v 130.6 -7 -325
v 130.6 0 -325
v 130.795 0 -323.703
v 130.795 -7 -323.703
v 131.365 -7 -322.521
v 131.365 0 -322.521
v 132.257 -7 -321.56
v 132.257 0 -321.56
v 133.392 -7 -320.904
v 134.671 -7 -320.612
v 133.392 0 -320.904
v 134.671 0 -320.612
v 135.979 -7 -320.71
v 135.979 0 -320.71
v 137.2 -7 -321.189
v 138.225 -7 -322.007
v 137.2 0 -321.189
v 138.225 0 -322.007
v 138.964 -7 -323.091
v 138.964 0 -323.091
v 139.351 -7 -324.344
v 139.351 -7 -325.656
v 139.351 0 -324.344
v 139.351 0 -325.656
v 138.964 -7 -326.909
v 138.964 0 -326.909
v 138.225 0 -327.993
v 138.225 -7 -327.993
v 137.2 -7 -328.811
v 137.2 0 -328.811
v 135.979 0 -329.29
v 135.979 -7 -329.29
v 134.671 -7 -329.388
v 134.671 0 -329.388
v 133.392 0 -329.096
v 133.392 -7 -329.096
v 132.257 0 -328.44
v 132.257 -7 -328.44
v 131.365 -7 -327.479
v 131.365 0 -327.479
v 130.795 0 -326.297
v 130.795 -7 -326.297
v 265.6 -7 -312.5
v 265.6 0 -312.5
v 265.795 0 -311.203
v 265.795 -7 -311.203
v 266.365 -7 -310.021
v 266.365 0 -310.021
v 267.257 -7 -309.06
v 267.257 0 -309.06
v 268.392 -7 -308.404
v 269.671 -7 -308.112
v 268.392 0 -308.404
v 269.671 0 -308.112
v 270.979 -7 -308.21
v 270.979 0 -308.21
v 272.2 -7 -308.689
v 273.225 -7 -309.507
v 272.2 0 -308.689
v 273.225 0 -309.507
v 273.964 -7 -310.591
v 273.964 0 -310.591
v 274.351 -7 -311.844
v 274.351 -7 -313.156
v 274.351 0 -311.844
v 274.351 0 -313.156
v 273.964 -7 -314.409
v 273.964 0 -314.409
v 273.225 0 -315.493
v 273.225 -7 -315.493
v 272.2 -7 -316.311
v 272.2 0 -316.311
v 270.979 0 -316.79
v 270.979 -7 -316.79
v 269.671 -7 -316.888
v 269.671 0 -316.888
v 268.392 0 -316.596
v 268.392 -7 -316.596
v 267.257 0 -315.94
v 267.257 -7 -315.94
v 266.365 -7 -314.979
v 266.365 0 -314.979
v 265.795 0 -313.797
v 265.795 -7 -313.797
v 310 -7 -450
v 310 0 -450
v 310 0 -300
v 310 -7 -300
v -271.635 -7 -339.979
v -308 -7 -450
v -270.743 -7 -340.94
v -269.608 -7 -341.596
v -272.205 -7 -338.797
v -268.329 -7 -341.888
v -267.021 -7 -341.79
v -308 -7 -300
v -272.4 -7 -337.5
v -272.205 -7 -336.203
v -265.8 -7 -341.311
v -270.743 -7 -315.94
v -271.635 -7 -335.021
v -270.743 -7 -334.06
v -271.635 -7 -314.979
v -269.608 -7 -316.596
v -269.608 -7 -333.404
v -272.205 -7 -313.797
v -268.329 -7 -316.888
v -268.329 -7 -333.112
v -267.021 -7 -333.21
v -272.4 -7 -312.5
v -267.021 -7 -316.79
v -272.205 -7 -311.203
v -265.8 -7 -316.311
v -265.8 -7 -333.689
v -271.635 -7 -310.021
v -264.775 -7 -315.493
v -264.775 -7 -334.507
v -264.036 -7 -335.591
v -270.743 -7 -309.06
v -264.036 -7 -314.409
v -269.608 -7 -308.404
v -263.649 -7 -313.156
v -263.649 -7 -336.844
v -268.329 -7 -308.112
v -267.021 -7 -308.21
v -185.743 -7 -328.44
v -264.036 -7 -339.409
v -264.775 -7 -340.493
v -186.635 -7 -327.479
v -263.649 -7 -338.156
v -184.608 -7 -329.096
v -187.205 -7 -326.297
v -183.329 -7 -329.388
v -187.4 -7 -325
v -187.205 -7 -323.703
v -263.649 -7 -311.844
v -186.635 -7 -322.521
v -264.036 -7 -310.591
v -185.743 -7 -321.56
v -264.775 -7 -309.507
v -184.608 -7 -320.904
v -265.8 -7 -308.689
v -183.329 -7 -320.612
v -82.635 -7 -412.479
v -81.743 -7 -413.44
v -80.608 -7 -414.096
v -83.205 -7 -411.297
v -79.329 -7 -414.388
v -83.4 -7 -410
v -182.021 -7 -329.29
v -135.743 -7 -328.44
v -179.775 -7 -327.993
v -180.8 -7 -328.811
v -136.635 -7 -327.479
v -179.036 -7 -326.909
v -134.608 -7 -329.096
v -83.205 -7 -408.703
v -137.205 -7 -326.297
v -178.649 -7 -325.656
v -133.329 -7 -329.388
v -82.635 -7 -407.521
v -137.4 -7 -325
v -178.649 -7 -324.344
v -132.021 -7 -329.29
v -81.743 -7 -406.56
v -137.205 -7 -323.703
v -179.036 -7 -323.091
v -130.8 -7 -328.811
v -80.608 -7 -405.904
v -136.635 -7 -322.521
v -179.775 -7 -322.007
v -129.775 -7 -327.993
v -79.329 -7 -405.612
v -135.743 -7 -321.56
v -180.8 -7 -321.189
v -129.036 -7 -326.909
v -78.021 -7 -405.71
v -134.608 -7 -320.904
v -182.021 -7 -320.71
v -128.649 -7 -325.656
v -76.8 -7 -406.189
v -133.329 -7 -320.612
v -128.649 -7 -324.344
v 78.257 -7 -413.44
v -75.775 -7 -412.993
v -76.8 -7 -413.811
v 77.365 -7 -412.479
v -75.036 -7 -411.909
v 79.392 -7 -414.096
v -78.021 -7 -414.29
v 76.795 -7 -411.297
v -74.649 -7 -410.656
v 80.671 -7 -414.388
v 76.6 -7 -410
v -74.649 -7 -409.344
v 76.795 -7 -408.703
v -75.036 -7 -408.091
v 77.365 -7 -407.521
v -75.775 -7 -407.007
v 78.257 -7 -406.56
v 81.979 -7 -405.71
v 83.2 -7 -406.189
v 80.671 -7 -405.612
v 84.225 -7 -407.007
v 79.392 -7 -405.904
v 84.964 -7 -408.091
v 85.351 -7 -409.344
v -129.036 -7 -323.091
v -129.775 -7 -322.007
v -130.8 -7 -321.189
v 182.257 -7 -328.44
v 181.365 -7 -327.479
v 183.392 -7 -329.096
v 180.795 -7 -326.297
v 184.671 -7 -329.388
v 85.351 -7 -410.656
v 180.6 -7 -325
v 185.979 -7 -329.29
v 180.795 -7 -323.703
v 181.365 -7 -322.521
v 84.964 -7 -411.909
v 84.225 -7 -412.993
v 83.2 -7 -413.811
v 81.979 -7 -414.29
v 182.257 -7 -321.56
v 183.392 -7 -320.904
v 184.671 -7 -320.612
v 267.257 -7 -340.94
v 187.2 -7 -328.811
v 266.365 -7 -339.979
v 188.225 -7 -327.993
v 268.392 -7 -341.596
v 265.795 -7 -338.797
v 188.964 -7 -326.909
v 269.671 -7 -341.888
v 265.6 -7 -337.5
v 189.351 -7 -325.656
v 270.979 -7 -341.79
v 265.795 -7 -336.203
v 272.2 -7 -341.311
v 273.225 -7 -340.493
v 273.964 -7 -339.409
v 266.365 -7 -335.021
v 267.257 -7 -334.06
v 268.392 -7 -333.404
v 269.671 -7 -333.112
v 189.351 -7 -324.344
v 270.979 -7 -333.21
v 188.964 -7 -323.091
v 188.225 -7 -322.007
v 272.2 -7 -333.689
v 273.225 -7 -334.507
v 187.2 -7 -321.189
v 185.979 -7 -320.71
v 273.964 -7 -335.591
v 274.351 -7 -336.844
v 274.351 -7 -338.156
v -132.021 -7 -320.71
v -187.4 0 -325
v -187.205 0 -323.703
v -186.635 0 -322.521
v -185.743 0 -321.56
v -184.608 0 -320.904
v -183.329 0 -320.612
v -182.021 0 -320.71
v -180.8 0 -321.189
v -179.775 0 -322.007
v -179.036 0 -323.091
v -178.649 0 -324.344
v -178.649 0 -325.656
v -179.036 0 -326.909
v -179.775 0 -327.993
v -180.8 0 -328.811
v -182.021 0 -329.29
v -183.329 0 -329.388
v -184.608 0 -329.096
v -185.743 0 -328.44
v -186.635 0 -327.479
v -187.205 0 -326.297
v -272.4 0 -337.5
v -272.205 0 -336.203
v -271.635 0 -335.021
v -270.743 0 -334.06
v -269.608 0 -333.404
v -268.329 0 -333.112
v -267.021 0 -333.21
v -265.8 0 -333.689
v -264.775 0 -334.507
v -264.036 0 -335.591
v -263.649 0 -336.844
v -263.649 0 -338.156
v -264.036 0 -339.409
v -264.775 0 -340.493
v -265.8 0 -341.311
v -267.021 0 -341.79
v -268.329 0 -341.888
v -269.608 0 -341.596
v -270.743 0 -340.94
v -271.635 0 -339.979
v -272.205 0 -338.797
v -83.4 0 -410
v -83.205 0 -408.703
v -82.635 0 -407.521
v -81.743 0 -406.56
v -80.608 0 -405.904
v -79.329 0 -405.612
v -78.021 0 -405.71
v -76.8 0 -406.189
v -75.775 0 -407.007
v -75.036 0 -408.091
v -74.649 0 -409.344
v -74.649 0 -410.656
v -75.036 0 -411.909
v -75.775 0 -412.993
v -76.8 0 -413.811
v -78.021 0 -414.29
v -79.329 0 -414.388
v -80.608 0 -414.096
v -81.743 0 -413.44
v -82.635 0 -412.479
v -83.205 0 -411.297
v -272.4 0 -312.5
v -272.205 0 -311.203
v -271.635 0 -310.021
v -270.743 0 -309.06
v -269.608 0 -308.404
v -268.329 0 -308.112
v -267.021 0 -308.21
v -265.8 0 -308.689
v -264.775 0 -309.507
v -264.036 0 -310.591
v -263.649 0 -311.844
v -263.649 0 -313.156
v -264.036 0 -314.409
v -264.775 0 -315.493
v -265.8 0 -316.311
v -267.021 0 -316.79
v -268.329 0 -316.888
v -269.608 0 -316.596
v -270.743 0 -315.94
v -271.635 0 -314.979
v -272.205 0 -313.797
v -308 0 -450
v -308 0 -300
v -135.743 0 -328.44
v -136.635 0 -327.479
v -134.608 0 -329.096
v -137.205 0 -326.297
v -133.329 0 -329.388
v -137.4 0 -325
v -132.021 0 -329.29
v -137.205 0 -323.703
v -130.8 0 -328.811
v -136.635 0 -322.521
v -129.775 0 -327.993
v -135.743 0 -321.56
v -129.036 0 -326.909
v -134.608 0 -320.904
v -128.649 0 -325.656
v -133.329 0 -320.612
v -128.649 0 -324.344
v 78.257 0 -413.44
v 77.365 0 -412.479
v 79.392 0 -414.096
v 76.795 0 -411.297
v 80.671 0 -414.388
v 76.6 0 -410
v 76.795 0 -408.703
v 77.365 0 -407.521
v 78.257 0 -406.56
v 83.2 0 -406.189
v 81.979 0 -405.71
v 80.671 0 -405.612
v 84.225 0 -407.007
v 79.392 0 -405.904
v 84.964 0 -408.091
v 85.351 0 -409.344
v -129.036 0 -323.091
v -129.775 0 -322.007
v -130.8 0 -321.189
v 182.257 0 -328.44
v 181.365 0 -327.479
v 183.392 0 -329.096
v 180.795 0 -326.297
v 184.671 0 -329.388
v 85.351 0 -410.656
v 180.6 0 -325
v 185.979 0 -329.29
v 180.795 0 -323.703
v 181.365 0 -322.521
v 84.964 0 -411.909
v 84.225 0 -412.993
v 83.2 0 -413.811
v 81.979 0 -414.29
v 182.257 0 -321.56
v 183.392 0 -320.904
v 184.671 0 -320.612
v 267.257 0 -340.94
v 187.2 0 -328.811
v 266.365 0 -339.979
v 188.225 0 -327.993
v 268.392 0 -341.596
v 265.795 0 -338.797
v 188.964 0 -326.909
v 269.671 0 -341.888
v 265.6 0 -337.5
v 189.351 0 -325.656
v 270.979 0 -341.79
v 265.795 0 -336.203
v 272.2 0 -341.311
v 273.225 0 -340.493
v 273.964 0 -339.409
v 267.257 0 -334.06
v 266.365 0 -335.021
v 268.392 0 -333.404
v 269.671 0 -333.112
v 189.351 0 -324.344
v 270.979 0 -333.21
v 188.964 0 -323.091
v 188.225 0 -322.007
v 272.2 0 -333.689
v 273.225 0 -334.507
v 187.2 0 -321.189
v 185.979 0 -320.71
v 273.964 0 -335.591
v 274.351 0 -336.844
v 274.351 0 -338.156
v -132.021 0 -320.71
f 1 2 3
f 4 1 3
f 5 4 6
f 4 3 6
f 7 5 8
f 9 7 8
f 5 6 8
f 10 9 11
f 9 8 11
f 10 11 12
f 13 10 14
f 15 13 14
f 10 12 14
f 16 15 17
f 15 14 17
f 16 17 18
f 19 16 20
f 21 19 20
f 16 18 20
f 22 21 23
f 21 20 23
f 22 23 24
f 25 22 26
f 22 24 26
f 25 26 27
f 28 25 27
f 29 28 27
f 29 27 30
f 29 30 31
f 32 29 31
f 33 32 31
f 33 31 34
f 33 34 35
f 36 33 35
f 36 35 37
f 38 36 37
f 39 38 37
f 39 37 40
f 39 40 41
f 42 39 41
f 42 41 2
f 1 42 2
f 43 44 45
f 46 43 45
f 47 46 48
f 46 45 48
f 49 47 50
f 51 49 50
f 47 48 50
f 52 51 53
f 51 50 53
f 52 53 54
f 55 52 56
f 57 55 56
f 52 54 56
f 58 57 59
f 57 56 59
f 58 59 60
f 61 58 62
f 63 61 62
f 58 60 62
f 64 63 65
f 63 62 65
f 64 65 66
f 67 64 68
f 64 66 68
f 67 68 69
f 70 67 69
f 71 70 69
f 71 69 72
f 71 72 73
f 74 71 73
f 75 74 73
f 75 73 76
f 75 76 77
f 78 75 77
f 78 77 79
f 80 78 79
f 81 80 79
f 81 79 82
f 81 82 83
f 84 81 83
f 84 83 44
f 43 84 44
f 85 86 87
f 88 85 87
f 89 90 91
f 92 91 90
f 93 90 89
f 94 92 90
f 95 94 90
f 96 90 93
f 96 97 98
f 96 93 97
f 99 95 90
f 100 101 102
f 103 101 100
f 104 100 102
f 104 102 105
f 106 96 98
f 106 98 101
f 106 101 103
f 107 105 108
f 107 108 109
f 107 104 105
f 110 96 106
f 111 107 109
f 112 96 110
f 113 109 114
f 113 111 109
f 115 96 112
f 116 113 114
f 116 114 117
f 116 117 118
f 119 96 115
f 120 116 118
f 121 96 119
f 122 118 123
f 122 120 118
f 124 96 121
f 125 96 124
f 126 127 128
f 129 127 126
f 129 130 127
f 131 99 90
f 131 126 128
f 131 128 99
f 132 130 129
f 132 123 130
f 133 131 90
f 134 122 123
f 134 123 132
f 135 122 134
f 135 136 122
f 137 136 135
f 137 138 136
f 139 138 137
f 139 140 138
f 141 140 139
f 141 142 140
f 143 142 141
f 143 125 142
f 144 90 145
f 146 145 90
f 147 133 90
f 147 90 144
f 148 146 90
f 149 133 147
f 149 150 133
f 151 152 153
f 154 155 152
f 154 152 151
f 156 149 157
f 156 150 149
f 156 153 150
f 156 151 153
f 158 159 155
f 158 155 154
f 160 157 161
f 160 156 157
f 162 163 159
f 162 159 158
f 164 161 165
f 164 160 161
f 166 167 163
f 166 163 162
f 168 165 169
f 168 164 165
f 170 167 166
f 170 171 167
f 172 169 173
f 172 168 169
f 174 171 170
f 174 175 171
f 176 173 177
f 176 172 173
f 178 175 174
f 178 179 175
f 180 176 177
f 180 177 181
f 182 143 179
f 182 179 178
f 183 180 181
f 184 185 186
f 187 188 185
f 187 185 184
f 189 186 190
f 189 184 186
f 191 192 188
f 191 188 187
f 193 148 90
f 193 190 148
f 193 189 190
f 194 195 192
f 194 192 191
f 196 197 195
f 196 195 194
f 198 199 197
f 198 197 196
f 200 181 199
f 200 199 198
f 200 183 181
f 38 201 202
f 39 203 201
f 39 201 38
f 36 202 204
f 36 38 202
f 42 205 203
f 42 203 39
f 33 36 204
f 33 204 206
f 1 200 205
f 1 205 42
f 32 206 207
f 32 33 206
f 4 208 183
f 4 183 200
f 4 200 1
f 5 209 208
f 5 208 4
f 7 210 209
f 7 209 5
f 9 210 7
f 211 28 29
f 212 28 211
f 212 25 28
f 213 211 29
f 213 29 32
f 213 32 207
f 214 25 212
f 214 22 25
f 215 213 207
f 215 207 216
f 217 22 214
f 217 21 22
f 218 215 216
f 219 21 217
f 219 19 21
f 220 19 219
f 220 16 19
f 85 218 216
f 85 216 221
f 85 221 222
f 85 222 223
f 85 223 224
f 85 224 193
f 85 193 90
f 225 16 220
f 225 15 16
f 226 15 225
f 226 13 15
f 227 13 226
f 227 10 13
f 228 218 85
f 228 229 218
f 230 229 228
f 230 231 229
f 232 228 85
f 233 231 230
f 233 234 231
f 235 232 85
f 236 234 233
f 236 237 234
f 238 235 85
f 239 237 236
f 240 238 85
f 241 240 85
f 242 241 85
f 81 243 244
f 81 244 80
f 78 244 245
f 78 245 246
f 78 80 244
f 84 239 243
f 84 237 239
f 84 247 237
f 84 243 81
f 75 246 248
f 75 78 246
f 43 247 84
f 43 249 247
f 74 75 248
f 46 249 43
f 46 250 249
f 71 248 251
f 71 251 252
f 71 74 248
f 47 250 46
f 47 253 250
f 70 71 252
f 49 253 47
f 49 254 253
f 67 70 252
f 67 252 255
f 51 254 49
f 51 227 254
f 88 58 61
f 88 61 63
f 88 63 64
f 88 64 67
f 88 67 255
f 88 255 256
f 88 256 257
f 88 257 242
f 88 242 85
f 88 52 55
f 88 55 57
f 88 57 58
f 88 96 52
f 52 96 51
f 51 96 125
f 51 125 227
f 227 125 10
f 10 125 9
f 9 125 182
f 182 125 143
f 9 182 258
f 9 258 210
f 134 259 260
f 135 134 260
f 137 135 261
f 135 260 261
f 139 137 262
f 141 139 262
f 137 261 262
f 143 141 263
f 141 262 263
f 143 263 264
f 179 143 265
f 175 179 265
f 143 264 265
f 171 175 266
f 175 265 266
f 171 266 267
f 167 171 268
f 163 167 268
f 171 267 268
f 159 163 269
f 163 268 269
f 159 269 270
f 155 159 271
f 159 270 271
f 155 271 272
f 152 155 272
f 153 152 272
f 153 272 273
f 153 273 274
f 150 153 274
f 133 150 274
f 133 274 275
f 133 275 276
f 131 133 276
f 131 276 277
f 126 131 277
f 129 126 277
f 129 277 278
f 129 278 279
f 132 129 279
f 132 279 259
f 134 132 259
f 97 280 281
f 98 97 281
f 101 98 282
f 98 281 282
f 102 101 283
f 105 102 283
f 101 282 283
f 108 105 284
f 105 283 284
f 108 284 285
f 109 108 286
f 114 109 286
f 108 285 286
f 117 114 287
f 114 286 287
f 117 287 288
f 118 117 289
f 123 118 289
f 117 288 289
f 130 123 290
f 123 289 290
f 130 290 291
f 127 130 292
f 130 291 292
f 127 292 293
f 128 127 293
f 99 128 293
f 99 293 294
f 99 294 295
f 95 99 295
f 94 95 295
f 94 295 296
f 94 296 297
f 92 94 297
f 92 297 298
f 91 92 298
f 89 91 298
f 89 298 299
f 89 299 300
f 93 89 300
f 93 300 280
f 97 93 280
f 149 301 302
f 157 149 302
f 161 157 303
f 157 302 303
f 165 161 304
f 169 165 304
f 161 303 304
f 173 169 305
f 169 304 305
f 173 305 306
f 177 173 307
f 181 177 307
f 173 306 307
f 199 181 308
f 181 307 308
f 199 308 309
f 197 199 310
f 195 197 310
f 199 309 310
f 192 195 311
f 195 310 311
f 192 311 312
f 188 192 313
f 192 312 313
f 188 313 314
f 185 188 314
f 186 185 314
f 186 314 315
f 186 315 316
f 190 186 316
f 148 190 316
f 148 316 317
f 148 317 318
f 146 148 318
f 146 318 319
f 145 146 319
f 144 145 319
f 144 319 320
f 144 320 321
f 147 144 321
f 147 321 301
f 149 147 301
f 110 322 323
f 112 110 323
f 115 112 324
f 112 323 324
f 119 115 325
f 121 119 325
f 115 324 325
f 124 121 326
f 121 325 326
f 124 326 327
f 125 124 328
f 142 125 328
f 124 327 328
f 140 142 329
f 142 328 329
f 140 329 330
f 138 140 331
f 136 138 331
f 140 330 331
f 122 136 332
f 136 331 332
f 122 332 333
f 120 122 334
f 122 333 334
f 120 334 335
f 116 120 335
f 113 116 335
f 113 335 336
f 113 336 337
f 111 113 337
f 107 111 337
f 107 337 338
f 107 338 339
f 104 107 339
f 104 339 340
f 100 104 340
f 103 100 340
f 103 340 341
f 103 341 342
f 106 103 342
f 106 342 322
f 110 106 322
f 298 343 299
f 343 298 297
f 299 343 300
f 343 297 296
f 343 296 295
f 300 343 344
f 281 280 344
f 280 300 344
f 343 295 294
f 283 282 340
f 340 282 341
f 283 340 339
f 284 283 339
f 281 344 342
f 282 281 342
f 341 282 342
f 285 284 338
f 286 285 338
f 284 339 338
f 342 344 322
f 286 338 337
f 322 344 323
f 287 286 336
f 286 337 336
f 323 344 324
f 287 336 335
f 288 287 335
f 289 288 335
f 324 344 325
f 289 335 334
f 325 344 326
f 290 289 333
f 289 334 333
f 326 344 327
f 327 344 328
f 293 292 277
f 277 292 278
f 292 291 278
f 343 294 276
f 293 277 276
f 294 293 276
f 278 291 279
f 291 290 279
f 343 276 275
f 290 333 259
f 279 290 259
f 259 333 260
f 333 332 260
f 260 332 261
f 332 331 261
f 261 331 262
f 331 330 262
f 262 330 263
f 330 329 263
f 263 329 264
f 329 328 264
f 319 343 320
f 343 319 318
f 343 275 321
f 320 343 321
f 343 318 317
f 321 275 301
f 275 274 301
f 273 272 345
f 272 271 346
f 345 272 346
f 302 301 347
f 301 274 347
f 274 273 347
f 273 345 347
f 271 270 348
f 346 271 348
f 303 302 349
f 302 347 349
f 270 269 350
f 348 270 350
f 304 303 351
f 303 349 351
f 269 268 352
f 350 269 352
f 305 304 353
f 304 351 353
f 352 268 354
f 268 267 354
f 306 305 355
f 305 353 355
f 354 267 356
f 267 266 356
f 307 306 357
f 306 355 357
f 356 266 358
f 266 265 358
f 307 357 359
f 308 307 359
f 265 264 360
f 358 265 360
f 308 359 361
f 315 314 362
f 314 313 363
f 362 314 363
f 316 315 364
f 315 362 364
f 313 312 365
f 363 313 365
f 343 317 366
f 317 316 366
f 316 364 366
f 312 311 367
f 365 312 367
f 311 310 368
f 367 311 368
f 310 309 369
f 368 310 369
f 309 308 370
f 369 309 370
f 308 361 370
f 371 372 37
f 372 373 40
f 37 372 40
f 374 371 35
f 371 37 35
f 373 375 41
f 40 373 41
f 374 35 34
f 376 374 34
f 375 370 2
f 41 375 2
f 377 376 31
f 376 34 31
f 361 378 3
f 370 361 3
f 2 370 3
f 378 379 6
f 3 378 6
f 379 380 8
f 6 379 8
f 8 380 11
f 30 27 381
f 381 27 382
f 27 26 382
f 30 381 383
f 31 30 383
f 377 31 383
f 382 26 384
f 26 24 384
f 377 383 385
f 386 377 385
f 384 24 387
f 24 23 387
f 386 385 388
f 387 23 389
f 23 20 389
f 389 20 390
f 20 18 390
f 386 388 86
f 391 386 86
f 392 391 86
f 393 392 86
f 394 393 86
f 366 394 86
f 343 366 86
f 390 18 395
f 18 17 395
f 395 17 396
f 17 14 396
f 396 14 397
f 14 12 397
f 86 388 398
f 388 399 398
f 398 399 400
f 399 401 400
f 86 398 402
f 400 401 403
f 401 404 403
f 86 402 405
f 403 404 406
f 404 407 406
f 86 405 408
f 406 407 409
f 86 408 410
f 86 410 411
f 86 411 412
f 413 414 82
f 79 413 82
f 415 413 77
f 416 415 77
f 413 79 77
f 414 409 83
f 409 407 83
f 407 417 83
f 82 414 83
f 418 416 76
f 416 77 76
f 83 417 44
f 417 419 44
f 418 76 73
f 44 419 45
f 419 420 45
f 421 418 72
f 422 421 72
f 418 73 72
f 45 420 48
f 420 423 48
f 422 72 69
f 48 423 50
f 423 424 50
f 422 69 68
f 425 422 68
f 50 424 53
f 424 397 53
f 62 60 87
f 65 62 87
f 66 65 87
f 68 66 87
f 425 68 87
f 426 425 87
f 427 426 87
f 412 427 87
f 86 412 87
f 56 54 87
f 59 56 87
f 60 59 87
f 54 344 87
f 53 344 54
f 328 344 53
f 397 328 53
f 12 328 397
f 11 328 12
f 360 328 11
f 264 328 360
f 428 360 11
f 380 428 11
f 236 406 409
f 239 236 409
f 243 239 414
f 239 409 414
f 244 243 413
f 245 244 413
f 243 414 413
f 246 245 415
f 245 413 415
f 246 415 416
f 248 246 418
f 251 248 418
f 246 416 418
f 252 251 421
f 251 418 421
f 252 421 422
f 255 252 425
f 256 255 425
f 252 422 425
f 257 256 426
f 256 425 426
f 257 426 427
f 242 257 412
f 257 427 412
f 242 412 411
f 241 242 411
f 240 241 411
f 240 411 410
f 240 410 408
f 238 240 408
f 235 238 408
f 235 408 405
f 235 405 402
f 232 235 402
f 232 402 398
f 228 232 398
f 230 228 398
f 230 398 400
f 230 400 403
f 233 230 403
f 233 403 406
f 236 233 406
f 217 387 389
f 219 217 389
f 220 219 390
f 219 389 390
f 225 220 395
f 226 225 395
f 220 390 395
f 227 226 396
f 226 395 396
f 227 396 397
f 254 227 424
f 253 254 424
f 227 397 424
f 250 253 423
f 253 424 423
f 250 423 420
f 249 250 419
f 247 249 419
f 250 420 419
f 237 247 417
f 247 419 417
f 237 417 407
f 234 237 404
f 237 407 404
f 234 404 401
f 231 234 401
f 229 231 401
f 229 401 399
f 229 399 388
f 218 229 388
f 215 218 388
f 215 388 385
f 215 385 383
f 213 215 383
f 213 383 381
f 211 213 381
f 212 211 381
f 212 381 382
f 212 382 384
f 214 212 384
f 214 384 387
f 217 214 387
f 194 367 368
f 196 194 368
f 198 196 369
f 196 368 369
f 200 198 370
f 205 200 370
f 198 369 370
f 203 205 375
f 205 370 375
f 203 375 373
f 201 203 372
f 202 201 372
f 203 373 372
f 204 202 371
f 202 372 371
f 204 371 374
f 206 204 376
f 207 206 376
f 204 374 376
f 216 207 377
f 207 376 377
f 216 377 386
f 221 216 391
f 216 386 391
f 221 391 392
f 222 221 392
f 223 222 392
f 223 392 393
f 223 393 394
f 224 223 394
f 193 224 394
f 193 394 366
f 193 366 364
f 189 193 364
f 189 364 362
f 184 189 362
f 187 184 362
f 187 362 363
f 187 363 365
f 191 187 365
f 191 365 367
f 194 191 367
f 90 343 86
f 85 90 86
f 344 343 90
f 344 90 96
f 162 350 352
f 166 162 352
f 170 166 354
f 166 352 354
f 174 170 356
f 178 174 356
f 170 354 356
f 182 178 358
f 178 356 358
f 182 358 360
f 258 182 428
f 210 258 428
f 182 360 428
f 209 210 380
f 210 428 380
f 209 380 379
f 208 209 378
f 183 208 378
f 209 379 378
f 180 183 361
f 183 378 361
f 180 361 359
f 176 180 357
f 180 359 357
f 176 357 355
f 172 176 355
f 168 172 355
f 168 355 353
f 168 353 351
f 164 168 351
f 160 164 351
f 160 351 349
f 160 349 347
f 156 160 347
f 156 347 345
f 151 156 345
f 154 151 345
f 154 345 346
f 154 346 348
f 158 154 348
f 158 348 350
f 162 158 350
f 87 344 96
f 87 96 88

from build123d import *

# Parameters (mm, degrees)
F0_W     = 618
F0_H     = 150
F1_DEPTH = 7
F3_D     = 8.8
F5_D     = 8.8


# Not quite as in the source:
# - a feature names something its author has since deleted; it is built from what else it names


with BuildPart() as f1:
    # F0 (on Front) → F1 (new body)
    with BuildSketch(Plane.XZ):
        with Locations((1, -375)):
            Rectangle(F0_W, F0_H)
    extrude(amount=F1_DEPTH)

    # F3 (through all)
    with Locations(Plane.XZ.offset(7)):
        with Locations((-183, -325), (-133, -325), (185, -325), (135, -325)):
            Hole(F3_D / 2)

    # F5 (through all)
    with Locations(Plane.XZ.offset(7)):
        with Locations((-268, -337.5), (-268, -312.5), (270, -337.5), (270, -312.5), (-79, -410), (81, -410)):
            Hole(F5_D / 2)


solid = f1.part
